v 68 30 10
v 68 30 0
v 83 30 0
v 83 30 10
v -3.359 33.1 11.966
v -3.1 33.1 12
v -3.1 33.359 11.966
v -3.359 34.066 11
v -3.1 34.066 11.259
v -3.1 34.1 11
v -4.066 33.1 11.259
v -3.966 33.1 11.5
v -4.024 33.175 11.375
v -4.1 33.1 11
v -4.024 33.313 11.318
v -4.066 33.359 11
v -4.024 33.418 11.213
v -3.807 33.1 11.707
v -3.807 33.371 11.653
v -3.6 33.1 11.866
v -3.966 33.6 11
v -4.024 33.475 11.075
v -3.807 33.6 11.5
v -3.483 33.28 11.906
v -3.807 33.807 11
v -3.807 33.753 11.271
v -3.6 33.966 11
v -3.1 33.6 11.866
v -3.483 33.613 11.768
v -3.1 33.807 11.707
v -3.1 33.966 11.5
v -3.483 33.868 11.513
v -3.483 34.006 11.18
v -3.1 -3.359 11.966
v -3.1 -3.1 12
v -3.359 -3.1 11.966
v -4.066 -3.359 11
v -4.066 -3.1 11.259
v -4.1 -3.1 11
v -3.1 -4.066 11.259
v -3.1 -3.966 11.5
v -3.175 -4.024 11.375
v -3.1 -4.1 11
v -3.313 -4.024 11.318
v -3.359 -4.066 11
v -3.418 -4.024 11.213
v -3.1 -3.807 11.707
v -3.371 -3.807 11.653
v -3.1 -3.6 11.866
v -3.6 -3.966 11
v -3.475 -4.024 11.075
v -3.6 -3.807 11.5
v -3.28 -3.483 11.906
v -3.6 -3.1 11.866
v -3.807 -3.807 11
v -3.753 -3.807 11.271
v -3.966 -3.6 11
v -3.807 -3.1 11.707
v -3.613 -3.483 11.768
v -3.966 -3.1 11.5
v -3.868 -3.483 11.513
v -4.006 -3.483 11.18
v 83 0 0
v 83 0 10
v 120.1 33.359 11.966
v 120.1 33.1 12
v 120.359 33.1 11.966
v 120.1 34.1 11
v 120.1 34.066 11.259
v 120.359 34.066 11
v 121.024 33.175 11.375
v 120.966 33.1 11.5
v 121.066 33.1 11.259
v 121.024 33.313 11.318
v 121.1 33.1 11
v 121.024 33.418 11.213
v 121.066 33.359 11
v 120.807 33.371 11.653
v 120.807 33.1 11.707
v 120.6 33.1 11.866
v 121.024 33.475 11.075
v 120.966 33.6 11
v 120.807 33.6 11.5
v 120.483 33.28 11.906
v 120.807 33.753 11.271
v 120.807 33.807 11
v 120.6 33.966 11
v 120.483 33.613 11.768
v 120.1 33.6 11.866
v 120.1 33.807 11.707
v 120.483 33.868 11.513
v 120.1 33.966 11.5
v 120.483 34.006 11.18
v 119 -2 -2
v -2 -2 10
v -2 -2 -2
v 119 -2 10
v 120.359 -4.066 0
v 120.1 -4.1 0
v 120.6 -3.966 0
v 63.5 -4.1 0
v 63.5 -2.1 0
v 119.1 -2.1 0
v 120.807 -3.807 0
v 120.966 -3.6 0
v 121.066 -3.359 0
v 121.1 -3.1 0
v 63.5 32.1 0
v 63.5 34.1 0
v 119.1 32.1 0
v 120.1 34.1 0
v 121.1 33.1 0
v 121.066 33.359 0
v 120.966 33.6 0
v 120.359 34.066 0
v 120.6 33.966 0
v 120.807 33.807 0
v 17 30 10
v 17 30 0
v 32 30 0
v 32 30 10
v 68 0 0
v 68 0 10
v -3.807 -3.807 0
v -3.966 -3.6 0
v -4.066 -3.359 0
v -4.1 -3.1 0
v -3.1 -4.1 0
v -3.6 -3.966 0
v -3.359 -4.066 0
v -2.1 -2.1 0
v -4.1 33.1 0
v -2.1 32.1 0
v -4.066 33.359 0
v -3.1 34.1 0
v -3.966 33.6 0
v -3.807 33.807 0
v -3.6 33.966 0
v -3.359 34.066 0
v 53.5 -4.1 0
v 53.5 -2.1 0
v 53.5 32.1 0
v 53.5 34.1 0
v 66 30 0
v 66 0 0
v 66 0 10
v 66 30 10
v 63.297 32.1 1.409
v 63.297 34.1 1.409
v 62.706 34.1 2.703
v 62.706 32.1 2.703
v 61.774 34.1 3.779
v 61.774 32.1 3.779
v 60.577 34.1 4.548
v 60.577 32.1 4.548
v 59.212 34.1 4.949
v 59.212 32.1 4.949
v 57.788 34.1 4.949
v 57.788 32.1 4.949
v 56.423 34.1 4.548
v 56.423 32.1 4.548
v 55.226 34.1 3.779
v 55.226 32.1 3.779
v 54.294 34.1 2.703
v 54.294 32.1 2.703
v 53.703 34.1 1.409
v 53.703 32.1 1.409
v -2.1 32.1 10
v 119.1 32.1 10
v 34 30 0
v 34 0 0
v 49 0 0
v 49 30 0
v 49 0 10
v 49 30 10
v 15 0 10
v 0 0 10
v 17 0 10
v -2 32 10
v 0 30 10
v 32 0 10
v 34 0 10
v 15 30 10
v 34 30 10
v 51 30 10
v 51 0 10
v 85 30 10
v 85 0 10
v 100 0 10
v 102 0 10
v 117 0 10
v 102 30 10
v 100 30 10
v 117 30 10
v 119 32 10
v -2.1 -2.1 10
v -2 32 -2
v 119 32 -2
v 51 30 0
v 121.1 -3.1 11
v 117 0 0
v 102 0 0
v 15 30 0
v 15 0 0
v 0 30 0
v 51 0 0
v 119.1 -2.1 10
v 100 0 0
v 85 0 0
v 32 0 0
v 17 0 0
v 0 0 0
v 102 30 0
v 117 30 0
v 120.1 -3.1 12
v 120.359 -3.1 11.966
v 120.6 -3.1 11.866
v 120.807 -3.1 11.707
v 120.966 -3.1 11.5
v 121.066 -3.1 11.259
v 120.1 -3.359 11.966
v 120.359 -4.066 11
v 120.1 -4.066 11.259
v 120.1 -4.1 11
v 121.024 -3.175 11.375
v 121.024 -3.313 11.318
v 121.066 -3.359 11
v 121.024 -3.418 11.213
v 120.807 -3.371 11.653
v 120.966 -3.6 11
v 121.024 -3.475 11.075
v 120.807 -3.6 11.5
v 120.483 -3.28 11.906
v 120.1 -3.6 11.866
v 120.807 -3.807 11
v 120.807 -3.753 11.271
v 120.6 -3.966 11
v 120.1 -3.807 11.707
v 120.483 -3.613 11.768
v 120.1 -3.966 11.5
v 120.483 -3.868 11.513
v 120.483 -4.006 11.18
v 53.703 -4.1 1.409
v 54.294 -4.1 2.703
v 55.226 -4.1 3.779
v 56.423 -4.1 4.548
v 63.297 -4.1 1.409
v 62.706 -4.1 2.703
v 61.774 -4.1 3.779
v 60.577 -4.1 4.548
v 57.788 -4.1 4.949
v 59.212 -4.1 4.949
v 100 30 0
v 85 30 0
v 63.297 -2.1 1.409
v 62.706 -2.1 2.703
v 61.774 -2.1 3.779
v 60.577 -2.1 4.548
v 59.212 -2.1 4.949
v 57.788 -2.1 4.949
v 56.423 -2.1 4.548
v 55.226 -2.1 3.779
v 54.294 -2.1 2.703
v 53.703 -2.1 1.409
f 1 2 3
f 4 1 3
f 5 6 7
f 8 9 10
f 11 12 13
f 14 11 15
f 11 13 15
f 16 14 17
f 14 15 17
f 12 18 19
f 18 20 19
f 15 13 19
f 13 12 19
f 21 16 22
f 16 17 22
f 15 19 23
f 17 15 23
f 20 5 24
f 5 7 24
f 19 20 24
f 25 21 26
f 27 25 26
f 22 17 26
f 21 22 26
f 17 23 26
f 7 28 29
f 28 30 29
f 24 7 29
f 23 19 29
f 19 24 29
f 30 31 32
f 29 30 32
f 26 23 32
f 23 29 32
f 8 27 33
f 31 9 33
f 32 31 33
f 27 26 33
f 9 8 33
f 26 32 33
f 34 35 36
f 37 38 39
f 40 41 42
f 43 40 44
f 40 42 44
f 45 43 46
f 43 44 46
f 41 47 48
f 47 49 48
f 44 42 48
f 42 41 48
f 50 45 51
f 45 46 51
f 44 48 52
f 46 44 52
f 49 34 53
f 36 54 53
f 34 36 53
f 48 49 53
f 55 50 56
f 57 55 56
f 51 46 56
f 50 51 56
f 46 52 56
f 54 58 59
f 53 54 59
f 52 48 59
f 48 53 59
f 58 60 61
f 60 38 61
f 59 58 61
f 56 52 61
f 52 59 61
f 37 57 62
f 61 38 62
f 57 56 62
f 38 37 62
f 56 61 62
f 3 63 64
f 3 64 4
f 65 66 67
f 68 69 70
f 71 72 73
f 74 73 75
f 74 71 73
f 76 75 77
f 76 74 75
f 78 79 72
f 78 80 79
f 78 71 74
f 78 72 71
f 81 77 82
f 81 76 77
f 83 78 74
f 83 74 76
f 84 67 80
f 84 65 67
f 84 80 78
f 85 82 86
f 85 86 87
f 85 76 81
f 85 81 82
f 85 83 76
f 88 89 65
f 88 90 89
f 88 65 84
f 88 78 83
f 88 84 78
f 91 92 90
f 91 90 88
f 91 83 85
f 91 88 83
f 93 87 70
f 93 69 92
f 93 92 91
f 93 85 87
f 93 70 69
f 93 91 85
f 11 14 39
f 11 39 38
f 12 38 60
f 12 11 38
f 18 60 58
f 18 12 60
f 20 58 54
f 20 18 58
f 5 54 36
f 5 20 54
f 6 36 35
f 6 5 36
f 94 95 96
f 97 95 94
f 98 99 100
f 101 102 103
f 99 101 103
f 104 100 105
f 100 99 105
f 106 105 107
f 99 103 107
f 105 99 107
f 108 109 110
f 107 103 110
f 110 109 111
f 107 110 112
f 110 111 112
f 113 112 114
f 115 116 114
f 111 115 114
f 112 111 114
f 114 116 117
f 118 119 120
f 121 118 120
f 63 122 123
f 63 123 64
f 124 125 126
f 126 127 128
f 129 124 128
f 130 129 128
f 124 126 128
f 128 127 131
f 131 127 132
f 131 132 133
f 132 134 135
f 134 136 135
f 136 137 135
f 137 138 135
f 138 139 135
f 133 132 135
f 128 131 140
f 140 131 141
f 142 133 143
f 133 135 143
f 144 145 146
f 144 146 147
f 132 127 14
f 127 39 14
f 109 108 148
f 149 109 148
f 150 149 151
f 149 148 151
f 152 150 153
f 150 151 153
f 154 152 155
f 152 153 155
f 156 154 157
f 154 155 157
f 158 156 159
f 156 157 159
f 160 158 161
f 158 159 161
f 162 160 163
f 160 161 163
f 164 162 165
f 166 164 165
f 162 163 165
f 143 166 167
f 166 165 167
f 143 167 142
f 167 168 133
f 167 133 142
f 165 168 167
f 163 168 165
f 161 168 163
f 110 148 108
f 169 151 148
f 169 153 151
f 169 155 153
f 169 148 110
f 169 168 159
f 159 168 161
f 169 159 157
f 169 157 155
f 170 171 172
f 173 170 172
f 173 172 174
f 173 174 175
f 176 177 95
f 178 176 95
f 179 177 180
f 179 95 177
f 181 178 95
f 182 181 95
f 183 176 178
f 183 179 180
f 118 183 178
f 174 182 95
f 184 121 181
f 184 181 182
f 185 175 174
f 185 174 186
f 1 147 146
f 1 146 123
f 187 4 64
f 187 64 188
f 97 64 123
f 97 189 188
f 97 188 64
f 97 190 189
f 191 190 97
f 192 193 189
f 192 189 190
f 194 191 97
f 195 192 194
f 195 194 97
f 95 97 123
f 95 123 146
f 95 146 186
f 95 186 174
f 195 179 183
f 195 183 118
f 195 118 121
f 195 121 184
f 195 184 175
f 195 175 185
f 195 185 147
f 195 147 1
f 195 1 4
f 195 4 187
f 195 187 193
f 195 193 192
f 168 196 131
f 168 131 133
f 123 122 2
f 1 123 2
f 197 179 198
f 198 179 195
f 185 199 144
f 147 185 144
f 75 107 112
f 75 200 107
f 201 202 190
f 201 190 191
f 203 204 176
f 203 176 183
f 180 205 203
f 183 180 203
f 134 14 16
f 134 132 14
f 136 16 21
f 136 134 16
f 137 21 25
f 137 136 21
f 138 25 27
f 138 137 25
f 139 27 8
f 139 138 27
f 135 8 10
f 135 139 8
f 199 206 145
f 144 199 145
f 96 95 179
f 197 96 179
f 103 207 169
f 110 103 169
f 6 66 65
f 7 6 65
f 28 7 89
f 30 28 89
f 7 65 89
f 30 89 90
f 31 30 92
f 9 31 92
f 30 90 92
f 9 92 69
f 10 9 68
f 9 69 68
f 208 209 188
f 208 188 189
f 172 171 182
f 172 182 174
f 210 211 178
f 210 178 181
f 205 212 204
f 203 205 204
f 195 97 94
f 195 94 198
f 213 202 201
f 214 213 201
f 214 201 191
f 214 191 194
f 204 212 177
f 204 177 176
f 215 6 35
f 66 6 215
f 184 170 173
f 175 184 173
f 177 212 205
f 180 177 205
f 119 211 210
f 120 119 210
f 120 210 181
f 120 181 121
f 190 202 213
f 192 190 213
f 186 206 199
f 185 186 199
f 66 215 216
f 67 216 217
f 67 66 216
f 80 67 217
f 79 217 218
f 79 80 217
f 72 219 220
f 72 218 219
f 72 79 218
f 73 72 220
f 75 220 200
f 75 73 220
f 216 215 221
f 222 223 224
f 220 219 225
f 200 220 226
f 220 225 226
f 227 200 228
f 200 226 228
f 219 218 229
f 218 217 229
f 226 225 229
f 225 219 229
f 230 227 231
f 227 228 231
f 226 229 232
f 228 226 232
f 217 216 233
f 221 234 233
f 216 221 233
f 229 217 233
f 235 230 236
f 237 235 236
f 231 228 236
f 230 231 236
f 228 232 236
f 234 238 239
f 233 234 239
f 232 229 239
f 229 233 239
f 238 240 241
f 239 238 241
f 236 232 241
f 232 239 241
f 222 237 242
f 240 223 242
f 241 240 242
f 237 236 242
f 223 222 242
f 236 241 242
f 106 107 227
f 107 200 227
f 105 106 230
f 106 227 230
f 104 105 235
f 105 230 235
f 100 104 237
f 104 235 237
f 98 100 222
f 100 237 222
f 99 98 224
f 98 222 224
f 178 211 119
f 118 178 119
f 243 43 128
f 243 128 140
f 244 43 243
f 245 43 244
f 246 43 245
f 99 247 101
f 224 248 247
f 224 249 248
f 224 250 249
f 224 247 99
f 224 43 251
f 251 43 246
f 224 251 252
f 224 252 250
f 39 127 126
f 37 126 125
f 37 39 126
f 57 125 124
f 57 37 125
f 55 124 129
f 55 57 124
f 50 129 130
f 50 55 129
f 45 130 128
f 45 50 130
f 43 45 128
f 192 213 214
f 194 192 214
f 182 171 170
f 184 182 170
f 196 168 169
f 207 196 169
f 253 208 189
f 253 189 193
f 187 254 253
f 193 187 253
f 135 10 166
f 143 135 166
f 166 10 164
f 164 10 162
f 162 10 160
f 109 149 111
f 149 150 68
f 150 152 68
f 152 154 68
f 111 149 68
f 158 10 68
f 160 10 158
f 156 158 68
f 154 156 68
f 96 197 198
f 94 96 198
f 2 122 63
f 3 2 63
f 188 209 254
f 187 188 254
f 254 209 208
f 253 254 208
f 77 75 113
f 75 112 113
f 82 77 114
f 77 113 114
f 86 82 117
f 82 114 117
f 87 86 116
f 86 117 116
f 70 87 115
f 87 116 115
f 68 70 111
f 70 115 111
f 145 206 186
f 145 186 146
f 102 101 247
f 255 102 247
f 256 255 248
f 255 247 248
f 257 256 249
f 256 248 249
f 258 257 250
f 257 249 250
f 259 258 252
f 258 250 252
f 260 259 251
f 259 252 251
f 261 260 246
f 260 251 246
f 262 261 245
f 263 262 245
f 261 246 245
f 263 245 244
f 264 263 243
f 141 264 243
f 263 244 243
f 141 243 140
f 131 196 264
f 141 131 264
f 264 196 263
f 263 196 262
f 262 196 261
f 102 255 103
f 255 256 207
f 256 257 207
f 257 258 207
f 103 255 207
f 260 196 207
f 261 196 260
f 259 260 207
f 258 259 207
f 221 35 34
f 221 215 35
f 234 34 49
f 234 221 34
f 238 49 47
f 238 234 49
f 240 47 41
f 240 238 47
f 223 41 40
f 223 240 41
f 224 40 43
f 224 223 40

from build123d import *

# Parameters (mm, degrees)
F0_W     = 121
F0_H     = 34
F0_W_2   = 15
F0_H_2   = 30
F1_DEPTH = 10
F2_DEPTH = 2
F3_W     = 125.2
F3_H     = 38.2
F3_W_2   = 121.2
F3_H_2   = 34.2
F3_W_3   = 121
F3_H_3   = 34
F3_W_4   = 15
F3_H_4   = 30
F4_DEPTH = 2
F5_DEPTH = 10
F6_R     = 1
F8_DEPTH = 38.201


with BuildPart() as f1:
    # F0 (on Top) → F1 (new body)
    with BuildSketch(Plane.XY):
        with Locations((58.5, 15)):
            Rectangle(F0_W, F0_H)
        with Locations((7.5, 15)):
            Rectangle(F0_W_2, F0_H_2, mode=Mode.SUBTRACT)
        with Locations((24.5, 15)):
            Rectangle(F0_W_2, F0_H_2, mode=Mode.SUBTRACT)
        with Locations((41.5, 15)):
            Rectangle(F0_W_2, F0_H_2, mode=Mode.SUBTRACT)
        with Locations((58.5, 15)):
            Rectangle(F0_W_2, F0_H_2, mode=Mode.SUBTRACT)
        with Locations((75.5, 15)):
            Rectangle(F0_W_2, F0_H_2, mode=Mode.SUBTRACT)
        with Locations((92.5, 15)):
            Rectangle(F0_W_2, F0_H_2, mode=Mode.SUBTRACT)
        with Locations((109.5, 15)):
            Rectangle(F0_W_2, F0_H_2, mode=Mode.SUBTRACT)
    extrude(amount=F1_DEPTH)

    # F0 (on Top) → F2 (join)
    with BuildSketch(Plane.XY):
        with Locations((58.5, 15)):
            Rectangle(F0_W, F0_H)
        with Locations((7.5, 15)):
            Rectangle(F0_W_2, F0_H_2, mode=Mode.SUBTRACT)
        with Locations((24.5, 15)):
            Rectangle(F0_W_2, F0_H_2, mode=Mode.SUBTRACT)
        with Locations((41.5, 15)):
            Rectangle(F0_W_2, F0_H_2, mode=Mode.SUBTRACT)
        with Locations((58.5, 15)):
            Rectangle(F0_W_2, F0_H_2, mode=Mode.SUBTRACT)
        with Locations((75.5, 15)):
            Rectangle(F0_W_2, F0_H_2, mode=Mode.SUBTRACT)
        with Locations((92.5, 15)):
            Rectangle(F0_W_2, F0_H_2, mode=Mode.SUBTRACT)
        with Locations((109.5, 15)):
            Rectangle(F0_W_2, F0_H_2, mode=Mode.SUBTRACT)
        with Locations((7.5, 15)):
            Rectangle(F0_W_2, F0_H_2)
        with Locations((24.5, 15)):
            Rectangle(F0_W_2, F0_H_2)
        with Locations((41.5, 15)):
            Rectangle(F0_W_2, F0_H_2)
        with Locations((58.5, 15)):
            Rectangle(F0_W_2, F0_H_2)
        with Locations((75.5, 15)):
            Rectangle(F0_W_2, F0_H_2)
        with Locations((92.5, 15)):
            Rectangle(F0_W_2, F0_H_2)
        with Locations((109.5, 15)):
            Rectangle(F0_W_2, F0_H_2)
    extrude(amount=-F2_DEPTH)


with BuildPart() as f4:
    # F3 (on face) → F4 (new body)
    with BuildSketch(Plane.XY.offset(10)):
        with Locations((58.5, 15)):
            Rectangle(F3_W, F3_H)
        with Locations((58.5, 15)):
            Rectangle(F3_W_2, F3_H_2, mode=Mode.SUBTRACT)
        with Locations((58.5, 15)):
            Rectangle(F3_W_2, F3_H_2)
        with Locations((58.5, 15)):
            Rectangle(F3_W_3, F3_H_3, mode=Mode.SUBTRACT)
        with Locations((58.5, 15)):
            Rectangle(F3_W_3, F3_H_3)
        with Locations((7.5, 15)):
            Rectangle(F3_W_4, F3_H_4, mode=Mode.SUBTRACT)
        with Locations((24.5, 15)):
            Rectangle(F3_W_4, F3_H_4, mode=Mode.SUBTRACT)
        with Locations((41.5, 15)):
            Rectangle(F3_W_4, F3_H_4, mode=Mode.SUBTRACT)
        with Locations((58.5, 15)):
            Rectangle(F3_W_4, F3_H_4, mode=Mode.SUBTRACT)
        with Locations((75.5, 15)):
            Rectangle(F3_W_4, F3_H_4, mode=Mode.SUBTRACT)
        with Locations((92.5, 15)):
            Rectangle(F3_W_4, F3_H_4, mode=Mode.SUBTRACT)
        with Locations((109.5, 15)):
            Rectangle(F3_W_4, F3_H_4, mode=Mode.SUBTRACT)
        with Locations((24.5, 15)):
            Rectangle(F3_W_4, F3_H_4)
        with Locations((7.5, 15)):
            Rectangle(F3_W_4, F3_H_4)
        with Locations((41.5, 15)):
            Rectangle(F3_W_4, F3_H_4)
        with Locations((58.5, 15)):
            Rectangle(F3_W_4, F3_H_4)
        with Locations((75.5, 15)):
            Rectangle(F3_W_4, F3_H_4)
        with Locations((92.5, 15)):
            Rectangle(F3_W_4, F3_H_4)
        with Locations((109.5, 15)):
            Rectangle(F3_W_4, F3_H_4)
    extrude(amount=F4_DEPTH)

    # F3 (on face) → F5 (join)
    with BuildSketch(Plane.XY.offset(10)):
        with Locations((58.5, 15)):
            Rectangle(F3_W, F3_H)
        with Locations((58.5, 15)):
            Rectangle(F3_W_2, F3_H_2, mode=Mode.SUBTRACT)
    extrude(amount=-F5_DEPTH)

    # F6
    f6_edges = [f4.edges().sort_by_distance(p)[0] for p in [
        (58.5, 34.1, 12),
        (-4.1, 15, 12),
        (58.5, -4.1, 12),
        (121.1, 15, 12),
        (-4.1, -4.1, 6),
        (121.1, -4.1, 6),
        (121.1, 34.1, 6),
        (-4.1, 34.1, 6),
    ]]
    fillet(f6_edges, radius=F6_R)

    # F7 (on face) → F8 (cut, through all)
    with BuildSketch(Plane.XZ.offset(4.1)):
        with BuildLine():
            Line((53.5, 0), (63.5, 0))
            ThreePointArc((63.5, 0), (58.5, 5), (53.5, 0))
        make_face()
    extrude(amount=-F8_DEPTH, mode=Mode.SUBTRACT)


solid = Compound([f1.part, f4.part])
